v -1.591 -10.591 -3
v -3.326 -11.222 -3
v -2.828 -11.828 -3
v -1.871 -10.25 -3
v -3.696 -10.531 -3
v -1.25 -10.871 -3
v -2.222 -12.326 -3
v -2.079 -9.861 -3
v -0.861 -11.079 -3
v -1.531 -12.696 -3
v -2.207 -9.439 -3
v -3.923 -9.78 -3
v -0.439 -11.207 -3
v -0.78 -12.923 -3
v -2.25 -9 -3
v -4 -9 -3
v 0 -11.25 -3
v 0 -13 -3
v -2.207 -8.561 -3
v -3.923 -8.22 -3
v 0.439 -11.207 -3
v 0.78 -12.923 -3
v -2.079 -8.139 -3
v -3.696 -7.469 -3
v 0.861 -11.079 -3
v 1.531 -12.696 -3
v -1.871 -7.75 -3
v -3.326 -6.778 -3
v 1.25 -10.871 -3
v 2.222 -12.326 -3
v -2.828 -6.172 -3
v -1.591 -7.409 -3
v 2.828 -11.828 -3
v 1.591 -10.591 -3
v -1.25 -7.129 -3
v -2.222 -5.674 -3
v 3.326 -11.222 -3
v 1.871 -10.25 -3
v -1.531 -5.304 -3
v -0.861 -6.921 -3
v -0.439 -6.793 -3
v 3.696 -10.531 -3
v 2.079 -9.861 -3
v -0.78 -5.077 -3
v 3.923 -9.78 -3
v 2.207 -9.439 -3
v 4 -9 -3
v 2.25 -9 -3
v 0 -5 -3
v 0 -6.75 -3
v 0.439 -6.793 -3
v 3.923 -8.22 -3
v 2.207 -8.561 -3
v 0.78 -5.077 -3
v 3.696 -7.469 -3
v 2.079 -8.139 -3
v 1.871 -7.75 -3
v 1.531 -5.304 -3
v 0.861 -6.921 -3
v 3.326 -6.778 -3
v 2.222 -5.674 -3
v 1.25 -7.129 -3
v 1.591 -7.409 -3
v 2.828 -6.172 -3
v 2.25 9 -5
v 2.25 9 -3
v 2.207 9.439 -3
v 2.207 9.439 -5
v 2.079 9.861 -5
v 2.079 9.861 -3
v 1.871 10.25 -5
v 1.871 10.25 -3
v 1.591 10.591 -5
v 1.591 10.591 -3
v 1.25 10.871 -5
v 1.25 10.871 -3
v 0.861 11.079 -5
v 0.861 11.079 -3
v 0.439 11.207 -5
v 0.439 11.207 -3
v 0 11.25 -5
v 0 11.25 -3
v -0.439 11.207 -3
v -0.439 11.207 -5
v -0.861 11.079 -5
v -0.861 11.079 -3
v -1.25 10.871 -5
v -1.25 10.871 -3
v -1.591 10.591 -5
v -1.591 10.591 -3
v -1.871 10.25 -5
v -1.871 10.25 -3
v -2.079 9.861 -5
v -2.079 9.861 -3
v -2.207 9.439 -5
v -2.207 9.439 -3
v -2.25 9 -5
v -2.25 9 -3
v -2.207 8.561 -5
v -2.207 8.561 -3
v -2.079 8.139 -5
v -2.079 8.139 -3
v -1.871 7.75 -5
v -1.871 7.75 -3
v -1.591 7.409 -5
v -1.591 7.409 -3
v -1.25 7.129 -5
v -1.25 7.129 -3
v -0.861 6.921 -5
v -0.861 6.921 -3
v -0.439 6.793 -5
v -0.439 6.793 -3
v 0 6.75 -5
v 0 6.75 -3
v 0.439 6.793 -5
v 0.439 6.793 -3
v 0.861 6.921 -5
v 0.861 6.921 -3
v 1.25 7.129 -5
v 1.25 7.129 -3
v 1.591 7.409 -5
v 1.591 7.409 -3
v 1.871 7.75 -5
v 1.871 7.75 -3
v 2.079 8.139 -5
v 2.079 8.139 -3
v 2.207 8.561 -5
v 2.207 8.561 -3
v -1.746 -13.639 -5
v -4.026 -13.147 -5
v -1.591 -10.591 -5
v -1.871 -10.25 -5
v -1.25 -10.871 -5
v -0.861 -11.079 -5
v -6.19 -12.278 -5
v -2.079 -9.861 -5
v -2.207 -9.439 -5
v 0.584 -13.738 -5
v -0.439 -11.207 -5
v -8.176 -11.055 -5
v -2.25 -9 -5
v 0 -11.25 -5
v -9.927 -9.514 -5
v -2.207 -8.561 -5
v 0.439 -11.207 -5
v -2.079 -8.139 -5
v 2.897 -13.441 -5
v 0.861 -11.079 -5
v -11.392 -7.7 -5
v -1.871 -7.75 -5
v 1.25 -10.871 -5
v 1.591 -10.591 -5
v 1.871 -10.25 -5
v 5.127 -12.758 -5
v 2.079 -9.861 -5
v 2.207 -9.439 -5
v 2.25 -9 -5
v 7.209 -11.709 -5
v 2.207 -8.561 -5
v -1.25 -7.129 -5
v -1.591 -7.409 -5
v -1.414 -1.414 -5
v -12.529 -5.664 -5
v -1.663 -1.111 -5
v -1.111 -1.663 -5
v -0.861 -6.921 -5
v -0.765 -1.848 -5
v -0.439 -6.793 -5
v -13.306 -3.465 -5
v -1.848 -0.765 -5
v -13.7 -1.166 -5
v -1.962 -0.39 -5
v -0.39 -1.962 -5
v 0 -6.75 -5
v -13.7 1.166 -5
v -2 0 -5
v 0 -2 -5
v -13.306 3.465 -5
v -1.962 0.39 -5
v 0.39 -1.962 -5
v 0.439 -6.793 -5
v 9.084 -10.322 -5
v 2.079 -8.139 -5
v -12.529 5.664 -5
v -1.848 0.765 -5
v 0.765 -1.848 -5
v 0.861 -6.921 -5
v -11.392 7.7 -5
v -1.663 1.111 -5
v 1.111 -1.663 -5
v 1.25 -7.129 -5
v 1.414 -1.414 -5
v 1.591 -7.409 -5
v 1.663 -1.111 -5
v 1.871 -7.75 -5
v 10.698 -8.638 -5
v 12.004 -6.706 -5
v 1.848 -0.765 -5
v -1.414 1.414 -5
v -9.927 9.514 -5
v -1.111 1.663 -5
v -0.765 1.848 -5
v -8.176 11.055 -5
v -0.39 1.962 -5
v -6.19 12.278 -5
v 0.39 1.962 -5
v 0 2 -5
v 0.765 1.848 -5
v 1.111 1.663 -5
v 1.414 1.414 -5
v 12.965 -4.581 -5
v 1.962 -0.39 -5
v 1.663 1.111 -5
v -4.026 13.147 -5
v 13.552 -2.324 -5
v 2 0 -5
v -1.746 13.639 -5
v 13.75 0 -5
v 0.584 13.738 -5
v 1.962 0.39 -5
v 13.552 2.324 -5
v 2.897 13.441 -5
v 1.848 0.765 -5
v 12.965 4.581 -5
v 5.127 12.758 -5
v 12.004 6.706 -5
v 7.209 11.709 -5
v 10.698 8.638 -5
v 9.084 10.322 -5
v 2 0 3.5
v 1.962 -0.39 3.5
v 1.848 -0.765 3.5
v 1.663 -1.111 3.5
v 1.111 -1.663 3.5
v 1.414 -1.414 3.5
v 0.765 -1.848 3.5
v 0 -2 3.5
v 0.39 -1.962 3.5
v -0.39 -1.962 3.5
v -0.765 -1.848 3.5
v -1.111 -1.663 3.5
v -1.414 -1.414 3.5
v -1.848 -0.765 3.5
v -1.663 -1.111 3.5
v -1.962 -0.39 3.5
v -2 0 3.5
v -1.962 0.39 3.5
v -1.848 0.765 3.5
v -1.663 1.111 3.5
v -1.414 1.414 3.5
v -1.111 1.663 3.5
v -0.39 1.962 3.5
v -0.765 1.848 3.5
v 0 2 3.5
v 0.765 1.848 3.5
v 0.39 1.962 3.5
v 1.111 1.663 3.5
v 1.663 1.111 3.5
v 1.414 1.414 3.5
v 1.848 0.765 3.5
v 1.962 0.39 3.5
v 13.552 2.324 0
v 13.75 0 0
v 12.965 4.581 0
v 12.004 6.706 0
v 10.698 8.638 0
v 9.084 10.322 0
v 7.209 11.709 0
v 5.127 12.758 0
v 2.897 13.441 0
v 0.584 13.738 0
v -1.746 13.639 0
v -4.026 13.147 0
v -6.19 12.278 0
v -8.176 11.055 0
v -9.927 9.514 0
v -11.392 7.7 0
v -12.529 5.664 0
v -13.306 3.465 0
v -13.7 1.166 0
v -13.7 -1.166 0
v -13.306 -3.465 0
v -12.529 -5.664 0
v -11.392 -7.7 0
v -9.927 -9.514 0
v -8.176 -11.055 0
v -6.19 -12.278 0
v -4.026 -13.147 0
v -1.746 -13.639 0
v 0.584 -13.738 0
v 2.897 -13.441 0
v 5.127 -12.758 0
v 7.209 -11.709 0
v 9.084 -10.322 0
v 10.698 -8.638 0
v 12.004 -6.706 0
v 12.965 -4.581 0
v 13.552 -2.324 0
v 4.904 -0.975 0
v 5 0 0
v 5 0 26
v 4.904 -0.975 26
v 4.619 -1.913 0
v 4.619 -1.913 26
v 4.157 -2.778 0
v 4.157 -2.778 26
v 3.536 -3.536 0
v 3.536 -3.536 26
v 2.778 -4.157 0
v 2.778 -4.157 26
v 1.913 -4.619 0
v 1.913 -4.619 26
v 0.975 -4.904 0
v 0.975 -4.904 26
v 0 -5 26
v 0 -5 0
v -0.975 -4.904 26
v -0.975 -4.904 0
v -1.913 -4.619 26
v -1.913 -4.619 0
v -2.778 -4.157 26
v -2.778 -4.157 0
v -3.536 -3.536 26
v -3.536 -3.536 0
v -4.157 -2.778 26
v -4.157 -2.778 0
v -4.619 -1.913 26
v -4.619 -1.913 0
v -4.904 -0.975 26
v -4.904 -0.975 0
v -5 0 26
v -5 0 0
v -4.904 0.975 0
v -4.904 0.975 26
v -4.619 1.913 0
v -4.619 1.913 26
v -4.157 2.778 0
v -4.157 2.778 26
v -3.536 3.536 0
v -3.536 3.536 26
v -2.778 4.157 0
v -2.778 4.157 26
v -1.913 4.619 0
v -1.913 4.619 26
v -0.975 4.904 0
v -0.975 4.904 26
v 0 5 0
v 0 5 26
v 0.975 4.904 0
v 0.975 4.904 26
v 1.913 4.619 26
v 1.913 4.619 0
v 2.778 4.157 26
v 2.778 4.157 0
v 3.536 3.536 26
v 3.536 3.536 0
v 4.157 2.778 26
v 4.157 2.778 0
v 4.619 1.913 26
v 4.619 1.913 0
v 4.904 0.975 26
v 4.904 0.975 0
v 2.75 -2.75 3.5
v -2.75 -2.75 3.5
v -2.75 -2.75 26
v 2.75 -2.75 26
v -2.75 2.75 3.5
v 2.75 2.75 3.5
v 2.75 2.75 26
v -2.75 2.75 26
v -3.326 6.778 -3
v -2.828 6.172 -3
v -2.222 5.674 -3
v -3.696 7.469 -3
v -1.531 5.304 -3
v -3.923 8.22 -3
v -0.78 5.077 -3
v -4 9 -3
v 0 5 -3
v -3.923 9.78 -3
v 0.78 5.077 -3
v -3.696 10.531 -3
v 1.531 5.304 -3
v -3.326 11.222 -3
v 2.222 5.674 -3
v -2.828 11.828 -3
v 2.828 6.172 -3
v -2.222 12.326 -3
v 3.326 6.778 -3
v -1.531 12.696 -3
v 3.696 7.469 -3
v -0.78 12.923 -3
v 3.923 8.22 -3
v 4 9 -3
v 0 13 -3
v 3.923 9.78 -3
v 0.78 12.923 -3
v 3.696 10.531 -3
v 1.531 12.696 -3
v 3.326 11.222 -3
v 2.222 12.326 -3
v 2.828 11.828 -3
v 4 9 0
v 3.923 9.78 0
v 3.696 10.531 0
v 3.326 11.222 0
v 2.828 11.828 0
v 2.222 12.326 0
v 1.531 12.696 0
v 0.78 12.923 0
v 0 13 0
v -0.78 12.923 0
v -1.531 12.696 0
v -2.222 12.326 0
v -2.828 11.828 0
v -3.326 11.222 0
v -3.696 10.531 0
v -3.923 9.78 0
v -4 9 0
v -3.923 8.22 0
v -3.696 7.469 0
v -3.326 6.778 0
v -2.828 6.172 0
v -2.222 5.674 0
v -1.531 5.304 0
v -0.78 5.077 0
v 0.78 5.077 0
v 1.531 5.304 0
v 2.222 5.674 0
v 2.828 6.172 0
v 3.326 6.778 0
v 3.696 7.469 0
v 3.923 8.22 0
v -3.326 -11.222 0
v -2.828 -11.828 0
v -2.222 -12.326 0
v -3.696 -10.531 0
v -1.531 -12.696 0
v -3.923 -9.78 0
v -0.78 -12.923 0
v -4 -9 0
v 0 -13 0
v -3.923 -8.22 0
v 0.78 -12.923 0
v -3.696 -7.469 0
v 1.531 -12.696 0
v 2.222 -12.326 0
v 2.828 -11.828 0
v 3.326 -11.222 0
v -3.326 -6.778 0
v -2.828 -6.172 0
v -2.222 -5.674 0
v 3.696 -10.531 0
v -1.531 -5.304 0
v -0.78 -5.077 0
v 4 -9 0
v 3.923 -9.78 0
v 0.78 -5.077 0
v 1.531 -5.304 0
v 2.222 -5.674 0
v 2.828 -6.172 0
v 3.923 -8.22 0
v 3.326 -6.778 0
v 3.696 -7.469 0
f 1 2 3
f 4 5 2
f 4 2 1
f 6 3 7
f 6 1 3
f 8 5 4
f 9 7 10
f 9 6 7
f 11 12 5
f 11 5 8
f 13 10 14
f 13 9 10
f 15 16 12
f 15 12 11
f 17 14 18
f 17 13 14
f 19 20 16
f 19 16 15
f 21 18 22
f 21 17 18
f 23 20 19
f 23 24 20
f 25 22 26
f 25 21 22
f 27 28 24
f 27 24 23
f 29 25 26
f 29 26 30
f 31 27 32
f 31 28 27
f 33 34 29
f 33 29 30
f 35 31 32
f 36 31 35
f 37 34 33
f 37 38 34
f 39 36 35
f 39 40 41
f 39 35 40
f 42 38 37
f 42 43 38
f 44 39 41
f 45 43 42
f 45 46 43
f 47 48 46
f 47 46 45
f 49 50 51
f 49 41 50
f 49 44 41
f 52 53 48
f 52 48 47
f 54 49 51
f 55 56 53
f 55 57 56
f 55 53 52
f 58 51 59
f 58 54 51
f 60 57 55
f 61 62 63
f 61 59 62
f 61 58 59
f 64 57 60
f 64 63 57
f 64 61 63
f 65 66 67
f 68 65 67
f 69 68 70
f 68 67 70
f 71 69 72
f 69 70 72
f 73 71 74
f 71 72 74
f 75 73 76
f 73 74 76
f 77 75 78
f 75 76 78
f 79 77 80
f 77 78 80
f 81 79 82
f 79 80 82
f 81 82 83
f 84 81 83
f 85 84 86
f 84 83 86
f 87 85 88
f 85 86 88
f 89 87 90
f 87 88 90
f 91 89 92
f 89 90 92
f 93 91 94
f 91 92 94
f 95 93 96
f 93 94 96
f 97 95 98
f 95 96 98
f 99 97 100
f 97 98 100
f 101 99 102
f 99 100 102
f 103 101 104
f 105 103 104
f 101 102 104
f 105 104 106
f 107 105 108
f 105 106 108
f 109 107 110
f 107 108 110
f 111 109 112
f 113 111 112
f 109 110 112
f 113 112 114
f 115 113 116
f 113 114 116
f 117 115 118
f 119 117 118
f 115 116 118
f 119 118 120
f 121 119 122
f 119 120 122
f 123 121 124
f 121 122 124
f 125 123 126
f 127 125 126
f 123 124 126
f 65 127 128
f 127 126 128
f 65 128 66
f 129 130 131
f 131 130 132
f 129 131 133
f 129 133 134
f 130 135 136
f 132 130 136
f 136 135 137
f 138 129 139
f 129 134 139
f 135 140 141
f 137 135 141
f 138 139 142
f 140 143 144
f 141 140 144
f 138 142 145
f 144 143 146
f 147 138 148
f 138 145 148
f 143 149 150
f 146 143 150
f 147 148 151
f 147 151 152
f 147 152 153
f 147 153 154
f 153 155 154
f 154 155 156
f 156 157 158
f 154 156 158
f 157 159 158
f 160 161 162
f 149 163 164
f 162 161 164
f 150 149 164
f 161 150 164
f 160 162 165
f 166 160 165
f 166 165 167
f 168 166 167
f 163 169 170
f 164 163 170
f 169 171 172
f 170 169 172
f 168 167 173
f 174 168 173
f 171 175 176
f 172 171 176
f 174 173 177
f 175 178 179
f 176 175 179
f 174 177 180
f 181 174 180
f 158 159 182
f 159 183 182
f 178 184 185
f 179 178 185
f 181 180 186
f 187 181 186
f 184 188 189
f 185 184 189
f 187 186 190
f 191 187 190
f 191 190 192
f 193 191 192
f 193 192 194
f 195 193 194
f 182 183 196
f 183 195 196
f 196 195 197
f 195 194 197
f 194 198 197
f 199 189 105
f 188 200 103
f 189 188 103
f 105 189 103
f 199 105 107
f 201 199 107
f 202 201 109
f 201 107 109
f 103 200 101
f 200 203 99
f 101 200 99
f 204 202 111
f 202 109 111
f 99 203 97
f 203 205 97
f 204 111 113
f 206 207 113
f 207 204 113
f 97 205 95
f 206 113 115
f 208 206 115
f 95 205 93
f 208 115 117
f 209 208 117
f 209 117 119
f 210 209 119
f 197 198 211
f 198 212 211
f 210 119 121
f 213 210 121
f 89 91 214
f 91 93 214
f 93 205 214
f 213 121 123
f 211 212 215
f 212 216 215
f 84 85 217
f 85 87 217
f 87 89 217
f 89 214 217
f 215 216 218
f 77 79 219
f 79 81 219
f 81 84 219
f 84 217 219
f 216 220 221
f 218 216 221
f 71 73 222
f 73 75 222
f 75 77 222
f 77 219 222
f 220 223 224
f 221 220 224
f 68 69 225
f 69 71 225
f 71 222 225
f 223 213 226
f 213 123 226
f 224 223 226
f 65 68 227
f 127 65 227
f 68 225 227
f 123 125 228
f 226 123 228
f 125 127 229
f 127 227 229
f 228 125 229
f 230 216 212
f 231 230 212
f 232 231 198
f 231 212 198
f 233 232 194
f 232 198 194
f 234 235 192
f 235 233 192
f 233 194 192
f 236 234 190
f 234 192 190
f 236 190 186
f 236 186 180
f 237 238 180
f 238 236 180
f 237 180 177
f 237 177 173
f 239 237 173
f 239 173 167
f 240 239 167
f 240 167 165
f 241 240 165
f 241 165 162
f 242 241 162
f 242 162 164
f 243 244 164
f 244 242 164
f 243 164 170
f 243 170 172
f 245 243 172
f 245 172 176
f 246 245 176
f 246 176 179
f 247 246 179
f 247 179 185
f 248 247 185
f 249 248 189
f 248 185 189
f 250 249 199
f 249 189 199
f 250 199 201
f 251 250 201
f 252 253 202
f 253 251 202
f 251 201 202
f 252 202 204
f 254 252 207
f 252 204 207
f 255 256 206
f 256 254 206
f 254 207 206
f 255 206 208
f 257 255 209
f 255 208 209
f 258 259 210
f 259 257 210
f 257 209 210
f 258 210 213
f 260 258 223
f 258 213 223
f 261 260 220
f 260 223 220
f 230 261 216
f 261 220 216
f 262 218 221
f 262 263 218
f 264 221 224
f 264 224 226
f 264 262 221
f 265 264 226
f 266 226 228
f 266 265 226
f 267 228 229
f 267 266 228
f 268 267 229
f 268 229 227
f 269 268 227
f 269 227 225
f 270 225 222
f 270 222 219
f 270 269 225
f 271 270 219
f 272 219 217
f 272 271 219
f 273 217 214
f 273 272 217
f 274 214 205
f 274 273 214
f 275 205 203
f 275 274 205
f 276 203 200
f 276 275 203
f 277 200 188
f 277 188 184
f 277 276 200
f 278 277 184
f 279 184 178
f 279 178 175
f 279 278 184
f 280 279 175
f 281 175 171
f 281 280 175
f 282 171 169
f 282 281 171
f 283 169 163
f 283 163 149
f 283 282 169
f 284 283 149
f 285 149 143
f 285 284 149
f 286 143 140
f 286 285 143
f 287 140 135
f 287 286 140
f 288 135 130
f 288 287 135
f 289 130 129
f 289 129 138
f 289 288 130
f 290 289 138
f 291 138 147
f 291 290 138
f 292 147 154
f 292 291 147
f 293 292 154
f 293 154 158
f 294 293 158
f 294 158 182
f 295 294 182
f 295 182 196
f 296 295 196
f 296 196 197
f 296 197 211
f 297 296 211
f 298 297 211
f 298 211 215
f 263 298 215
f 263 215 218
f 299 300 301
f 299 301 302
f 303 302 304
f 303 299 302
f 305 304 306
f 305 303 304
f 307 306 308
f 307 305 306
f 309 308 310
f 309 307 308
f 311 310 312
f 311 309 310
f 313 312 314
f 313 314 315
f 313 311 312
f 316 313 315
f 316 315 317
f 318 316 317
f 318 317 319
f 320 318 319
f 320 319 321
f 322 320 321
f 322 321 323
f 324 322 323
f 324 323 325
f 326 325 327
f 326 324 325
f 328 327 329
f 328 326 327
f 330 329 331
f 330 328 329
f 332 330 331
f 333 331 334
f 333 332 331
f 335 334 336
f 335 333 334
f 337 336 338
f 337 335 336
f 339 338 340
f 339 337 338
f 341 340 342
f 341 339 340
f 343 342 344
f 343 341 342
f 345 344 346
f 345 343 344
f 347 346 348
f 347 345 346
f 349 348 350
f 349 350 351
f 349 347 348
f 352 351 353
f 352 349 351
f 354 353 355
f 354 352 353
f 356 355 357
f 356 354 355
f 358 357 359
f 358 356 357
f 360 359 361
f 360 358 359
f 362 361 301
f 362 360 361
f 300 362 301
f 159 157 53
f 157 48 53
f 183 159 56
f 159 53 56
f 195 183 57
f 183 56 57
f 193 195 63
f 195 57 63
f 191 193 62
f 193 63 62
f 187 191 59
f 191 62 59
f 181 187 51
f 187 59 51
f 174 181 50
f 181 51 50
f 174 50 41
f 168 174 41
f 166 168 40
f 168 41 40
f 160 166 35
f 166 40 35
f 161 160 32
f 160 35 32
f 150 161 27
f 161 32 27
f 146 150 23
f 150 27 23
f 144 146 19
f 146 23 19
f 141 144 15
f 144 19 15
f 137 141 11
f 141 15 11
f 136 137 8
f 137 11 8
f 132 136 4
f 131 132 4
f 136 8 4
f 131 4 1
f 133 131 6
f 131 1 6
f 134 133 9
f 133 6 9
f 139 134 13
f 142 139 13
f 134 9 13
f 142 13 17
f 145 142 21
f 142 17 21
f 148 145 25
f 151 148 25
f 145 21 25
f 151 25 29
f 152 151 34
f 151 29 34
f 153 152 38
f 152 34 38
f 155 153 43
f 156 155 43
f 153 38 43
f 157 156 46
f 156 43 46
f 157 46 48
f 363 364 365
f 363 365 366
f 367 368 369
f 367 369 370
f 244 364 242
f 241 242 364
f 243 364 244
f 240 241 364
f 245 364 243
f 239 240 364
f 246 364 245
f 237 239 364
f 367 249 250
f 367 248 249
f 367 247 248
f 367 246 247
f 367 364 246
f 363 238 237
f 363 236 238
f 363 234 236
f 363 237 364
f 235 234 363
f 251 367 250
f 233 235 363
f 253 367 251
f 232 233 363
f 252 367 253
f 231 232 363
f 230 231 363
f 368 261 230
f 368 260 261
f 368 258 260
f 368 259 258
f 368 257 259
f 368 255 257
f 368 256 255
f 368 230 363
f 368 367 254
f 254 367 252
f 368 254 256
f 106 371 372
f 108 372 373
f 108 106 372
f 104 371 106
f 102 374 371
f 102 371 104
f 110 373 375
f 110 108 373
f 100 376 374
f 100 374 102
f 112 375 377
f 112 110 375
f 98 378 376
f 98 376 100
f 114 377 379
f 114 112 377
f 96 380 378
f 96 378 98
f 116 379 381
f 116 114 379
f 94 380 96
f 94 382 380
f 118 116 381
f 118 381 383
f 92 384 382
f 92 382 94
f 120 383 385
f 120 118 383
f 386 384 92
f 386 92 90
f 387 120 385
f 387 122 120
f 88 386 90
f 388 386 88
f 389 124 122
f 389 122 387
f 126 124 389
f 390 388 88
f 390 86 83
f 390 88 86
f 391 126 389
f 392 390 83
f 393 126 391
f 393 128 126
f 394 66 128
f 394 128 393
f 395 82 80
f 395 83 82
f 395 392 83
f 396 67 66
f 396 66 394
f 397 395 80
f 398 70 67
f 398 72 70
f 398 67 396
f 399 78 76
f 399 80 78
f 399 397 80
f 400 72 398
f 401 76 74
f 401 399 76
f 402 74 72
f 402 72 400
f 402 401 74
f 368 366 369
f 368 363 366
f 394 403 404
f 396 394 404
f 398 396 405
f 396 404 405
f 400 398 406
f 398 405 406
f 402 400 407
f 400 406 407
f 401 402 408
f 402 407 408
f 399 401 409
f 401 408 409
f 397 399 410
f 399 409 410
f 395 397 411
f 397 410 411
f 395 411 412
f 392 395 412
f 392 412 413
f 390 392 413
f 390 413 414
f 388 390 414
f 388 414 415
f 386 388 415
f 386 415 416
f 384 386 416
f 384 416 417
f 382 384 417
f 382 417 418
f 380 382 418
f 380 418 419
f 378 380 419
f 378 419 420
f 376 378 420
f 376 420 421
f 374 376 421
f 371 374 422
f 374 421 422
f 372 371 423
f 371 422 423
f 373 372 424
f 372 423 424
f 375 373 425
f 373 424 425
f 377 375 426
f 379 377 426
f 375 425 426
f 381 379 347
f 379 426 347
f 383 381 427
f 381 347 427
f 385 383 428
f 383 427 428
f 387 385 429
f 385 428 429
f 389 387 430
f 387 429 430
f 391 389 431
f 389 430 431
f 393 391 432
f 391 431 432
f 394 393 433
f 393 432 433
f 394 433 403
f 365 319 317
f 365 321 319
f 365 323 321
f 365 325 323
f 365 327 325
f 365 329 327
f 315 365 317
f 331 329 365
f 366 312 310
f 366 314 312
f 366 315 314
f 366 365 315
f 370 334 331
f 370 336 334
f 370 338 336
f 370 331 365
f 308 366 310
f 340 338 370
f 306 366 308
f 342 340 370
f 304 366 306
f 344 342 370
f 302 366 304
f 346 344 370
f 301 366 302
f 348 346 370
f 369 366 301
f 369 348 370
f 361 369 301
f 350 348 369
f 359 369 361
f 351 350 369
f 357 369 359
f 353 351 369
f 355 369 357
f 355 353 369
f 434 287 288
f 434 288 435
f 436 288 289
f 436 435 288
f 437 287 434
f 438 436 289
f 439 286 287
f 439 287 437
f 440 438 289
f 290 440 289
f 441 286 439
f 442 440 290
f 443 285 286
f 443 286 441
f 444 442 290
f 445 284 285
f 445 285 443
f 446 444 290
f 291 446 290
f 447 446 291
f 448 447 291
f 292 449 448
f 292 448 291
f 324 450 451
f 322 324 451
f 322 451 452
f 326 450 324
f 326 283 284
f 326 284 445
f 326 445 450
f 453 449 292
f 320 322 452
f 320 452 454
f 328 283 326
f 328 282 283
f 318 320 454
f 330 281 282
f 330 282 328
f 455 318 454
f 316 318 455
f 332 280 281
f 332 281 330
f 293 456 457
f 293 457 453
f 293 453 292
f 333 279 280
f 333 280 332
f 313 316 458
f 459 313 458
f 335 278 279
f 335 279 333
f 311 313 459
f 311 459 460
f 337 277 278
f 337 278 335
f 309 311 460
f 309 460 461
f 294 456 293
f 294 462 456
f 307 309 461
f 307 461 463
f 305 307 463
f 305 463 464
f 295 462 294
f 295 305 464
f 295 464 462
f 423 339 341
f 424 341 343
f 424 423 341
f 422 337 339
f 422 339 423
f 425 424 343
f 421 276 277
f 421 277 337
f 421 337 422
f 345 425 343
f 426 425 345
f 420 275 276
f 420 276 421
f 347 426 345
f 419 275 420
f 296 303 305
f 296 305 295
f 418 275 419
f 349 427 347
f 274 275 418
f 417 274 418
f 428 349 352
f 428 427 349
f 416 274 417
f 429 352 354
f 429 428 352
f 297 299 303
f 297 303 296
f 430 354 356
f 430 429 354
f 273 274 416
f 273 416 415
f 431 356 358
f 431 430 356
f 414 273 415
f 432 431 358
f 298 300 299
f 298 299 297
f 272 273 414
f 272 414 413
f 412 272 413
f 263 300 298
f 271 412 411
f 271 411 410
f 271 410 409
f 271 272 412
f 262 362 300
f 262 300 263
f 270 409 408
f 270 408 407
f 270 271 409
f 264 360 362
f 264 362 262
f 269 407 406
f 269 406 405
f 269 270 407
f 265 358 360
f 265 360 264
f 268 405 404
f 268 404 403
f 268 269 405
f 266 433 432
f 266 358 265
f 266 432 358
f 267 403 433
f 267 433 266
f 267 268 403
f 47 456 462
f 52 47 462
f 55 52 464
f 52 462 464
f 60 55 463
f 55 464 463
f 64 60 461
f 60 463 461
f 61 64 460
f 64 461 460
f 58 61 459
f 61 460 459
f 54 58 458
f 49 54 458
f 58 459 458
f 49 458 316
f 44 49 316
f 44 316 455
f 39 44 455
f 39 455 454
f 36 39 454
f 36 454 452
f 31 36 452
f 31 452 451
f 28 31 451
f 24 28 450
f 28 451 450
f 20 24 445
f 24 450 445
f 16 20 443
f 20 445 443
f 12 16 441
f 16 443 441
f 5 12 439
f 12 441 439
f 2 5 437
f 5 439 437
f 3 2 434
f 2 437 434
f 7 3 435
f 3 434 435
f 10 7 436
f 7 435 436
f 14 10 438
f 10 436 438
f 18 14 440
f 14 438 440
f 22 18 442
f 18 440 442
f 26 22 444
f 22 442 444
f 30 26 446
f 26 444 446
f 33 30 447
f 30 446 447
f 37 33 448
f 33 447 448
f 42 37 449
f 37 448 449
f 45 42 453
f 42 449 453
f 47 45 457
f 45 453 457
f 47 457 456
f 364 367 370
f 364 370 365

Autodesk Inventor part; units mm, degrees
ref_plane "YZ Plane" through (0, 0, 0) normal (1, 0, 0) x (0, 1, 0)
ref_plane "XZ Plane" through (0, 0, 0) normal (0, 1, 0) x (-1, 0, 0)
ref_plane "XY Plane" through (0, 0, 0) normal (0, 0, 1) x (1, 0, 0)
sketch "Skizze1" plane through (0, 0, 0) normal (0, 0, 1) x (1, 0, 0)
  circle A0 centre (0, 0) radius 13.75
  circle A1 centre (0, 0) radius 5
  line L0 (2.75, 2.75) -> (-2.75, 2.75)
  line L1 (-2.75, 2.75) -> (-2.75, -2.75)
  line L2 (-2.75, -2.75) -> (2.75, -2.75)
  line L3 (2.75, -2.75) -> (2.75, 2.75)
  line L4 (2.75, 2.75) -> (-2.75, -2.75) construction
  line L5 (-2.75, 2.75) -> (2.75, -2.75) construction
  line L6 (0, 13.75) -> (0, -13.75) construction
  circle A2 centre (0, 9) radius 4
  circle A3 centre (0, 9) radius 2.25
  circle A4 centre (0, -9) radius 4
  circle A5 centre (0, -9) radius 2.25
  line L7 (-13.75, 0) -> (13.75, 0) construction
  circle A6 centre (0, 0) radius 2
  dimension "d0" = 27.5
  dimension "d1" = 10
  dimension "d25" = 5.5
  dimension "d28" = 8
  dimension "d29" = 18
  dimension "d30" = 4.5
  dimension "d43" = 4
extrude "Extrusion1" add sketch "Skizze1" against normal blind 5 contours A0 | A1 | A4 | A2 | L3 L2 L1 L0
extrude "Extrusion8" cut sketch "Skizze1" against normal blind 3 contours A4 | A2
extrude "Extrusion9" add sketch "Skizze1" along normal blind 26 contours A1
extrude "Extrusion12" add sketch "Skizze1" along normal blind 3.5 contours L3 L2 L1 L0
properties part number "Schalter_Basis"
